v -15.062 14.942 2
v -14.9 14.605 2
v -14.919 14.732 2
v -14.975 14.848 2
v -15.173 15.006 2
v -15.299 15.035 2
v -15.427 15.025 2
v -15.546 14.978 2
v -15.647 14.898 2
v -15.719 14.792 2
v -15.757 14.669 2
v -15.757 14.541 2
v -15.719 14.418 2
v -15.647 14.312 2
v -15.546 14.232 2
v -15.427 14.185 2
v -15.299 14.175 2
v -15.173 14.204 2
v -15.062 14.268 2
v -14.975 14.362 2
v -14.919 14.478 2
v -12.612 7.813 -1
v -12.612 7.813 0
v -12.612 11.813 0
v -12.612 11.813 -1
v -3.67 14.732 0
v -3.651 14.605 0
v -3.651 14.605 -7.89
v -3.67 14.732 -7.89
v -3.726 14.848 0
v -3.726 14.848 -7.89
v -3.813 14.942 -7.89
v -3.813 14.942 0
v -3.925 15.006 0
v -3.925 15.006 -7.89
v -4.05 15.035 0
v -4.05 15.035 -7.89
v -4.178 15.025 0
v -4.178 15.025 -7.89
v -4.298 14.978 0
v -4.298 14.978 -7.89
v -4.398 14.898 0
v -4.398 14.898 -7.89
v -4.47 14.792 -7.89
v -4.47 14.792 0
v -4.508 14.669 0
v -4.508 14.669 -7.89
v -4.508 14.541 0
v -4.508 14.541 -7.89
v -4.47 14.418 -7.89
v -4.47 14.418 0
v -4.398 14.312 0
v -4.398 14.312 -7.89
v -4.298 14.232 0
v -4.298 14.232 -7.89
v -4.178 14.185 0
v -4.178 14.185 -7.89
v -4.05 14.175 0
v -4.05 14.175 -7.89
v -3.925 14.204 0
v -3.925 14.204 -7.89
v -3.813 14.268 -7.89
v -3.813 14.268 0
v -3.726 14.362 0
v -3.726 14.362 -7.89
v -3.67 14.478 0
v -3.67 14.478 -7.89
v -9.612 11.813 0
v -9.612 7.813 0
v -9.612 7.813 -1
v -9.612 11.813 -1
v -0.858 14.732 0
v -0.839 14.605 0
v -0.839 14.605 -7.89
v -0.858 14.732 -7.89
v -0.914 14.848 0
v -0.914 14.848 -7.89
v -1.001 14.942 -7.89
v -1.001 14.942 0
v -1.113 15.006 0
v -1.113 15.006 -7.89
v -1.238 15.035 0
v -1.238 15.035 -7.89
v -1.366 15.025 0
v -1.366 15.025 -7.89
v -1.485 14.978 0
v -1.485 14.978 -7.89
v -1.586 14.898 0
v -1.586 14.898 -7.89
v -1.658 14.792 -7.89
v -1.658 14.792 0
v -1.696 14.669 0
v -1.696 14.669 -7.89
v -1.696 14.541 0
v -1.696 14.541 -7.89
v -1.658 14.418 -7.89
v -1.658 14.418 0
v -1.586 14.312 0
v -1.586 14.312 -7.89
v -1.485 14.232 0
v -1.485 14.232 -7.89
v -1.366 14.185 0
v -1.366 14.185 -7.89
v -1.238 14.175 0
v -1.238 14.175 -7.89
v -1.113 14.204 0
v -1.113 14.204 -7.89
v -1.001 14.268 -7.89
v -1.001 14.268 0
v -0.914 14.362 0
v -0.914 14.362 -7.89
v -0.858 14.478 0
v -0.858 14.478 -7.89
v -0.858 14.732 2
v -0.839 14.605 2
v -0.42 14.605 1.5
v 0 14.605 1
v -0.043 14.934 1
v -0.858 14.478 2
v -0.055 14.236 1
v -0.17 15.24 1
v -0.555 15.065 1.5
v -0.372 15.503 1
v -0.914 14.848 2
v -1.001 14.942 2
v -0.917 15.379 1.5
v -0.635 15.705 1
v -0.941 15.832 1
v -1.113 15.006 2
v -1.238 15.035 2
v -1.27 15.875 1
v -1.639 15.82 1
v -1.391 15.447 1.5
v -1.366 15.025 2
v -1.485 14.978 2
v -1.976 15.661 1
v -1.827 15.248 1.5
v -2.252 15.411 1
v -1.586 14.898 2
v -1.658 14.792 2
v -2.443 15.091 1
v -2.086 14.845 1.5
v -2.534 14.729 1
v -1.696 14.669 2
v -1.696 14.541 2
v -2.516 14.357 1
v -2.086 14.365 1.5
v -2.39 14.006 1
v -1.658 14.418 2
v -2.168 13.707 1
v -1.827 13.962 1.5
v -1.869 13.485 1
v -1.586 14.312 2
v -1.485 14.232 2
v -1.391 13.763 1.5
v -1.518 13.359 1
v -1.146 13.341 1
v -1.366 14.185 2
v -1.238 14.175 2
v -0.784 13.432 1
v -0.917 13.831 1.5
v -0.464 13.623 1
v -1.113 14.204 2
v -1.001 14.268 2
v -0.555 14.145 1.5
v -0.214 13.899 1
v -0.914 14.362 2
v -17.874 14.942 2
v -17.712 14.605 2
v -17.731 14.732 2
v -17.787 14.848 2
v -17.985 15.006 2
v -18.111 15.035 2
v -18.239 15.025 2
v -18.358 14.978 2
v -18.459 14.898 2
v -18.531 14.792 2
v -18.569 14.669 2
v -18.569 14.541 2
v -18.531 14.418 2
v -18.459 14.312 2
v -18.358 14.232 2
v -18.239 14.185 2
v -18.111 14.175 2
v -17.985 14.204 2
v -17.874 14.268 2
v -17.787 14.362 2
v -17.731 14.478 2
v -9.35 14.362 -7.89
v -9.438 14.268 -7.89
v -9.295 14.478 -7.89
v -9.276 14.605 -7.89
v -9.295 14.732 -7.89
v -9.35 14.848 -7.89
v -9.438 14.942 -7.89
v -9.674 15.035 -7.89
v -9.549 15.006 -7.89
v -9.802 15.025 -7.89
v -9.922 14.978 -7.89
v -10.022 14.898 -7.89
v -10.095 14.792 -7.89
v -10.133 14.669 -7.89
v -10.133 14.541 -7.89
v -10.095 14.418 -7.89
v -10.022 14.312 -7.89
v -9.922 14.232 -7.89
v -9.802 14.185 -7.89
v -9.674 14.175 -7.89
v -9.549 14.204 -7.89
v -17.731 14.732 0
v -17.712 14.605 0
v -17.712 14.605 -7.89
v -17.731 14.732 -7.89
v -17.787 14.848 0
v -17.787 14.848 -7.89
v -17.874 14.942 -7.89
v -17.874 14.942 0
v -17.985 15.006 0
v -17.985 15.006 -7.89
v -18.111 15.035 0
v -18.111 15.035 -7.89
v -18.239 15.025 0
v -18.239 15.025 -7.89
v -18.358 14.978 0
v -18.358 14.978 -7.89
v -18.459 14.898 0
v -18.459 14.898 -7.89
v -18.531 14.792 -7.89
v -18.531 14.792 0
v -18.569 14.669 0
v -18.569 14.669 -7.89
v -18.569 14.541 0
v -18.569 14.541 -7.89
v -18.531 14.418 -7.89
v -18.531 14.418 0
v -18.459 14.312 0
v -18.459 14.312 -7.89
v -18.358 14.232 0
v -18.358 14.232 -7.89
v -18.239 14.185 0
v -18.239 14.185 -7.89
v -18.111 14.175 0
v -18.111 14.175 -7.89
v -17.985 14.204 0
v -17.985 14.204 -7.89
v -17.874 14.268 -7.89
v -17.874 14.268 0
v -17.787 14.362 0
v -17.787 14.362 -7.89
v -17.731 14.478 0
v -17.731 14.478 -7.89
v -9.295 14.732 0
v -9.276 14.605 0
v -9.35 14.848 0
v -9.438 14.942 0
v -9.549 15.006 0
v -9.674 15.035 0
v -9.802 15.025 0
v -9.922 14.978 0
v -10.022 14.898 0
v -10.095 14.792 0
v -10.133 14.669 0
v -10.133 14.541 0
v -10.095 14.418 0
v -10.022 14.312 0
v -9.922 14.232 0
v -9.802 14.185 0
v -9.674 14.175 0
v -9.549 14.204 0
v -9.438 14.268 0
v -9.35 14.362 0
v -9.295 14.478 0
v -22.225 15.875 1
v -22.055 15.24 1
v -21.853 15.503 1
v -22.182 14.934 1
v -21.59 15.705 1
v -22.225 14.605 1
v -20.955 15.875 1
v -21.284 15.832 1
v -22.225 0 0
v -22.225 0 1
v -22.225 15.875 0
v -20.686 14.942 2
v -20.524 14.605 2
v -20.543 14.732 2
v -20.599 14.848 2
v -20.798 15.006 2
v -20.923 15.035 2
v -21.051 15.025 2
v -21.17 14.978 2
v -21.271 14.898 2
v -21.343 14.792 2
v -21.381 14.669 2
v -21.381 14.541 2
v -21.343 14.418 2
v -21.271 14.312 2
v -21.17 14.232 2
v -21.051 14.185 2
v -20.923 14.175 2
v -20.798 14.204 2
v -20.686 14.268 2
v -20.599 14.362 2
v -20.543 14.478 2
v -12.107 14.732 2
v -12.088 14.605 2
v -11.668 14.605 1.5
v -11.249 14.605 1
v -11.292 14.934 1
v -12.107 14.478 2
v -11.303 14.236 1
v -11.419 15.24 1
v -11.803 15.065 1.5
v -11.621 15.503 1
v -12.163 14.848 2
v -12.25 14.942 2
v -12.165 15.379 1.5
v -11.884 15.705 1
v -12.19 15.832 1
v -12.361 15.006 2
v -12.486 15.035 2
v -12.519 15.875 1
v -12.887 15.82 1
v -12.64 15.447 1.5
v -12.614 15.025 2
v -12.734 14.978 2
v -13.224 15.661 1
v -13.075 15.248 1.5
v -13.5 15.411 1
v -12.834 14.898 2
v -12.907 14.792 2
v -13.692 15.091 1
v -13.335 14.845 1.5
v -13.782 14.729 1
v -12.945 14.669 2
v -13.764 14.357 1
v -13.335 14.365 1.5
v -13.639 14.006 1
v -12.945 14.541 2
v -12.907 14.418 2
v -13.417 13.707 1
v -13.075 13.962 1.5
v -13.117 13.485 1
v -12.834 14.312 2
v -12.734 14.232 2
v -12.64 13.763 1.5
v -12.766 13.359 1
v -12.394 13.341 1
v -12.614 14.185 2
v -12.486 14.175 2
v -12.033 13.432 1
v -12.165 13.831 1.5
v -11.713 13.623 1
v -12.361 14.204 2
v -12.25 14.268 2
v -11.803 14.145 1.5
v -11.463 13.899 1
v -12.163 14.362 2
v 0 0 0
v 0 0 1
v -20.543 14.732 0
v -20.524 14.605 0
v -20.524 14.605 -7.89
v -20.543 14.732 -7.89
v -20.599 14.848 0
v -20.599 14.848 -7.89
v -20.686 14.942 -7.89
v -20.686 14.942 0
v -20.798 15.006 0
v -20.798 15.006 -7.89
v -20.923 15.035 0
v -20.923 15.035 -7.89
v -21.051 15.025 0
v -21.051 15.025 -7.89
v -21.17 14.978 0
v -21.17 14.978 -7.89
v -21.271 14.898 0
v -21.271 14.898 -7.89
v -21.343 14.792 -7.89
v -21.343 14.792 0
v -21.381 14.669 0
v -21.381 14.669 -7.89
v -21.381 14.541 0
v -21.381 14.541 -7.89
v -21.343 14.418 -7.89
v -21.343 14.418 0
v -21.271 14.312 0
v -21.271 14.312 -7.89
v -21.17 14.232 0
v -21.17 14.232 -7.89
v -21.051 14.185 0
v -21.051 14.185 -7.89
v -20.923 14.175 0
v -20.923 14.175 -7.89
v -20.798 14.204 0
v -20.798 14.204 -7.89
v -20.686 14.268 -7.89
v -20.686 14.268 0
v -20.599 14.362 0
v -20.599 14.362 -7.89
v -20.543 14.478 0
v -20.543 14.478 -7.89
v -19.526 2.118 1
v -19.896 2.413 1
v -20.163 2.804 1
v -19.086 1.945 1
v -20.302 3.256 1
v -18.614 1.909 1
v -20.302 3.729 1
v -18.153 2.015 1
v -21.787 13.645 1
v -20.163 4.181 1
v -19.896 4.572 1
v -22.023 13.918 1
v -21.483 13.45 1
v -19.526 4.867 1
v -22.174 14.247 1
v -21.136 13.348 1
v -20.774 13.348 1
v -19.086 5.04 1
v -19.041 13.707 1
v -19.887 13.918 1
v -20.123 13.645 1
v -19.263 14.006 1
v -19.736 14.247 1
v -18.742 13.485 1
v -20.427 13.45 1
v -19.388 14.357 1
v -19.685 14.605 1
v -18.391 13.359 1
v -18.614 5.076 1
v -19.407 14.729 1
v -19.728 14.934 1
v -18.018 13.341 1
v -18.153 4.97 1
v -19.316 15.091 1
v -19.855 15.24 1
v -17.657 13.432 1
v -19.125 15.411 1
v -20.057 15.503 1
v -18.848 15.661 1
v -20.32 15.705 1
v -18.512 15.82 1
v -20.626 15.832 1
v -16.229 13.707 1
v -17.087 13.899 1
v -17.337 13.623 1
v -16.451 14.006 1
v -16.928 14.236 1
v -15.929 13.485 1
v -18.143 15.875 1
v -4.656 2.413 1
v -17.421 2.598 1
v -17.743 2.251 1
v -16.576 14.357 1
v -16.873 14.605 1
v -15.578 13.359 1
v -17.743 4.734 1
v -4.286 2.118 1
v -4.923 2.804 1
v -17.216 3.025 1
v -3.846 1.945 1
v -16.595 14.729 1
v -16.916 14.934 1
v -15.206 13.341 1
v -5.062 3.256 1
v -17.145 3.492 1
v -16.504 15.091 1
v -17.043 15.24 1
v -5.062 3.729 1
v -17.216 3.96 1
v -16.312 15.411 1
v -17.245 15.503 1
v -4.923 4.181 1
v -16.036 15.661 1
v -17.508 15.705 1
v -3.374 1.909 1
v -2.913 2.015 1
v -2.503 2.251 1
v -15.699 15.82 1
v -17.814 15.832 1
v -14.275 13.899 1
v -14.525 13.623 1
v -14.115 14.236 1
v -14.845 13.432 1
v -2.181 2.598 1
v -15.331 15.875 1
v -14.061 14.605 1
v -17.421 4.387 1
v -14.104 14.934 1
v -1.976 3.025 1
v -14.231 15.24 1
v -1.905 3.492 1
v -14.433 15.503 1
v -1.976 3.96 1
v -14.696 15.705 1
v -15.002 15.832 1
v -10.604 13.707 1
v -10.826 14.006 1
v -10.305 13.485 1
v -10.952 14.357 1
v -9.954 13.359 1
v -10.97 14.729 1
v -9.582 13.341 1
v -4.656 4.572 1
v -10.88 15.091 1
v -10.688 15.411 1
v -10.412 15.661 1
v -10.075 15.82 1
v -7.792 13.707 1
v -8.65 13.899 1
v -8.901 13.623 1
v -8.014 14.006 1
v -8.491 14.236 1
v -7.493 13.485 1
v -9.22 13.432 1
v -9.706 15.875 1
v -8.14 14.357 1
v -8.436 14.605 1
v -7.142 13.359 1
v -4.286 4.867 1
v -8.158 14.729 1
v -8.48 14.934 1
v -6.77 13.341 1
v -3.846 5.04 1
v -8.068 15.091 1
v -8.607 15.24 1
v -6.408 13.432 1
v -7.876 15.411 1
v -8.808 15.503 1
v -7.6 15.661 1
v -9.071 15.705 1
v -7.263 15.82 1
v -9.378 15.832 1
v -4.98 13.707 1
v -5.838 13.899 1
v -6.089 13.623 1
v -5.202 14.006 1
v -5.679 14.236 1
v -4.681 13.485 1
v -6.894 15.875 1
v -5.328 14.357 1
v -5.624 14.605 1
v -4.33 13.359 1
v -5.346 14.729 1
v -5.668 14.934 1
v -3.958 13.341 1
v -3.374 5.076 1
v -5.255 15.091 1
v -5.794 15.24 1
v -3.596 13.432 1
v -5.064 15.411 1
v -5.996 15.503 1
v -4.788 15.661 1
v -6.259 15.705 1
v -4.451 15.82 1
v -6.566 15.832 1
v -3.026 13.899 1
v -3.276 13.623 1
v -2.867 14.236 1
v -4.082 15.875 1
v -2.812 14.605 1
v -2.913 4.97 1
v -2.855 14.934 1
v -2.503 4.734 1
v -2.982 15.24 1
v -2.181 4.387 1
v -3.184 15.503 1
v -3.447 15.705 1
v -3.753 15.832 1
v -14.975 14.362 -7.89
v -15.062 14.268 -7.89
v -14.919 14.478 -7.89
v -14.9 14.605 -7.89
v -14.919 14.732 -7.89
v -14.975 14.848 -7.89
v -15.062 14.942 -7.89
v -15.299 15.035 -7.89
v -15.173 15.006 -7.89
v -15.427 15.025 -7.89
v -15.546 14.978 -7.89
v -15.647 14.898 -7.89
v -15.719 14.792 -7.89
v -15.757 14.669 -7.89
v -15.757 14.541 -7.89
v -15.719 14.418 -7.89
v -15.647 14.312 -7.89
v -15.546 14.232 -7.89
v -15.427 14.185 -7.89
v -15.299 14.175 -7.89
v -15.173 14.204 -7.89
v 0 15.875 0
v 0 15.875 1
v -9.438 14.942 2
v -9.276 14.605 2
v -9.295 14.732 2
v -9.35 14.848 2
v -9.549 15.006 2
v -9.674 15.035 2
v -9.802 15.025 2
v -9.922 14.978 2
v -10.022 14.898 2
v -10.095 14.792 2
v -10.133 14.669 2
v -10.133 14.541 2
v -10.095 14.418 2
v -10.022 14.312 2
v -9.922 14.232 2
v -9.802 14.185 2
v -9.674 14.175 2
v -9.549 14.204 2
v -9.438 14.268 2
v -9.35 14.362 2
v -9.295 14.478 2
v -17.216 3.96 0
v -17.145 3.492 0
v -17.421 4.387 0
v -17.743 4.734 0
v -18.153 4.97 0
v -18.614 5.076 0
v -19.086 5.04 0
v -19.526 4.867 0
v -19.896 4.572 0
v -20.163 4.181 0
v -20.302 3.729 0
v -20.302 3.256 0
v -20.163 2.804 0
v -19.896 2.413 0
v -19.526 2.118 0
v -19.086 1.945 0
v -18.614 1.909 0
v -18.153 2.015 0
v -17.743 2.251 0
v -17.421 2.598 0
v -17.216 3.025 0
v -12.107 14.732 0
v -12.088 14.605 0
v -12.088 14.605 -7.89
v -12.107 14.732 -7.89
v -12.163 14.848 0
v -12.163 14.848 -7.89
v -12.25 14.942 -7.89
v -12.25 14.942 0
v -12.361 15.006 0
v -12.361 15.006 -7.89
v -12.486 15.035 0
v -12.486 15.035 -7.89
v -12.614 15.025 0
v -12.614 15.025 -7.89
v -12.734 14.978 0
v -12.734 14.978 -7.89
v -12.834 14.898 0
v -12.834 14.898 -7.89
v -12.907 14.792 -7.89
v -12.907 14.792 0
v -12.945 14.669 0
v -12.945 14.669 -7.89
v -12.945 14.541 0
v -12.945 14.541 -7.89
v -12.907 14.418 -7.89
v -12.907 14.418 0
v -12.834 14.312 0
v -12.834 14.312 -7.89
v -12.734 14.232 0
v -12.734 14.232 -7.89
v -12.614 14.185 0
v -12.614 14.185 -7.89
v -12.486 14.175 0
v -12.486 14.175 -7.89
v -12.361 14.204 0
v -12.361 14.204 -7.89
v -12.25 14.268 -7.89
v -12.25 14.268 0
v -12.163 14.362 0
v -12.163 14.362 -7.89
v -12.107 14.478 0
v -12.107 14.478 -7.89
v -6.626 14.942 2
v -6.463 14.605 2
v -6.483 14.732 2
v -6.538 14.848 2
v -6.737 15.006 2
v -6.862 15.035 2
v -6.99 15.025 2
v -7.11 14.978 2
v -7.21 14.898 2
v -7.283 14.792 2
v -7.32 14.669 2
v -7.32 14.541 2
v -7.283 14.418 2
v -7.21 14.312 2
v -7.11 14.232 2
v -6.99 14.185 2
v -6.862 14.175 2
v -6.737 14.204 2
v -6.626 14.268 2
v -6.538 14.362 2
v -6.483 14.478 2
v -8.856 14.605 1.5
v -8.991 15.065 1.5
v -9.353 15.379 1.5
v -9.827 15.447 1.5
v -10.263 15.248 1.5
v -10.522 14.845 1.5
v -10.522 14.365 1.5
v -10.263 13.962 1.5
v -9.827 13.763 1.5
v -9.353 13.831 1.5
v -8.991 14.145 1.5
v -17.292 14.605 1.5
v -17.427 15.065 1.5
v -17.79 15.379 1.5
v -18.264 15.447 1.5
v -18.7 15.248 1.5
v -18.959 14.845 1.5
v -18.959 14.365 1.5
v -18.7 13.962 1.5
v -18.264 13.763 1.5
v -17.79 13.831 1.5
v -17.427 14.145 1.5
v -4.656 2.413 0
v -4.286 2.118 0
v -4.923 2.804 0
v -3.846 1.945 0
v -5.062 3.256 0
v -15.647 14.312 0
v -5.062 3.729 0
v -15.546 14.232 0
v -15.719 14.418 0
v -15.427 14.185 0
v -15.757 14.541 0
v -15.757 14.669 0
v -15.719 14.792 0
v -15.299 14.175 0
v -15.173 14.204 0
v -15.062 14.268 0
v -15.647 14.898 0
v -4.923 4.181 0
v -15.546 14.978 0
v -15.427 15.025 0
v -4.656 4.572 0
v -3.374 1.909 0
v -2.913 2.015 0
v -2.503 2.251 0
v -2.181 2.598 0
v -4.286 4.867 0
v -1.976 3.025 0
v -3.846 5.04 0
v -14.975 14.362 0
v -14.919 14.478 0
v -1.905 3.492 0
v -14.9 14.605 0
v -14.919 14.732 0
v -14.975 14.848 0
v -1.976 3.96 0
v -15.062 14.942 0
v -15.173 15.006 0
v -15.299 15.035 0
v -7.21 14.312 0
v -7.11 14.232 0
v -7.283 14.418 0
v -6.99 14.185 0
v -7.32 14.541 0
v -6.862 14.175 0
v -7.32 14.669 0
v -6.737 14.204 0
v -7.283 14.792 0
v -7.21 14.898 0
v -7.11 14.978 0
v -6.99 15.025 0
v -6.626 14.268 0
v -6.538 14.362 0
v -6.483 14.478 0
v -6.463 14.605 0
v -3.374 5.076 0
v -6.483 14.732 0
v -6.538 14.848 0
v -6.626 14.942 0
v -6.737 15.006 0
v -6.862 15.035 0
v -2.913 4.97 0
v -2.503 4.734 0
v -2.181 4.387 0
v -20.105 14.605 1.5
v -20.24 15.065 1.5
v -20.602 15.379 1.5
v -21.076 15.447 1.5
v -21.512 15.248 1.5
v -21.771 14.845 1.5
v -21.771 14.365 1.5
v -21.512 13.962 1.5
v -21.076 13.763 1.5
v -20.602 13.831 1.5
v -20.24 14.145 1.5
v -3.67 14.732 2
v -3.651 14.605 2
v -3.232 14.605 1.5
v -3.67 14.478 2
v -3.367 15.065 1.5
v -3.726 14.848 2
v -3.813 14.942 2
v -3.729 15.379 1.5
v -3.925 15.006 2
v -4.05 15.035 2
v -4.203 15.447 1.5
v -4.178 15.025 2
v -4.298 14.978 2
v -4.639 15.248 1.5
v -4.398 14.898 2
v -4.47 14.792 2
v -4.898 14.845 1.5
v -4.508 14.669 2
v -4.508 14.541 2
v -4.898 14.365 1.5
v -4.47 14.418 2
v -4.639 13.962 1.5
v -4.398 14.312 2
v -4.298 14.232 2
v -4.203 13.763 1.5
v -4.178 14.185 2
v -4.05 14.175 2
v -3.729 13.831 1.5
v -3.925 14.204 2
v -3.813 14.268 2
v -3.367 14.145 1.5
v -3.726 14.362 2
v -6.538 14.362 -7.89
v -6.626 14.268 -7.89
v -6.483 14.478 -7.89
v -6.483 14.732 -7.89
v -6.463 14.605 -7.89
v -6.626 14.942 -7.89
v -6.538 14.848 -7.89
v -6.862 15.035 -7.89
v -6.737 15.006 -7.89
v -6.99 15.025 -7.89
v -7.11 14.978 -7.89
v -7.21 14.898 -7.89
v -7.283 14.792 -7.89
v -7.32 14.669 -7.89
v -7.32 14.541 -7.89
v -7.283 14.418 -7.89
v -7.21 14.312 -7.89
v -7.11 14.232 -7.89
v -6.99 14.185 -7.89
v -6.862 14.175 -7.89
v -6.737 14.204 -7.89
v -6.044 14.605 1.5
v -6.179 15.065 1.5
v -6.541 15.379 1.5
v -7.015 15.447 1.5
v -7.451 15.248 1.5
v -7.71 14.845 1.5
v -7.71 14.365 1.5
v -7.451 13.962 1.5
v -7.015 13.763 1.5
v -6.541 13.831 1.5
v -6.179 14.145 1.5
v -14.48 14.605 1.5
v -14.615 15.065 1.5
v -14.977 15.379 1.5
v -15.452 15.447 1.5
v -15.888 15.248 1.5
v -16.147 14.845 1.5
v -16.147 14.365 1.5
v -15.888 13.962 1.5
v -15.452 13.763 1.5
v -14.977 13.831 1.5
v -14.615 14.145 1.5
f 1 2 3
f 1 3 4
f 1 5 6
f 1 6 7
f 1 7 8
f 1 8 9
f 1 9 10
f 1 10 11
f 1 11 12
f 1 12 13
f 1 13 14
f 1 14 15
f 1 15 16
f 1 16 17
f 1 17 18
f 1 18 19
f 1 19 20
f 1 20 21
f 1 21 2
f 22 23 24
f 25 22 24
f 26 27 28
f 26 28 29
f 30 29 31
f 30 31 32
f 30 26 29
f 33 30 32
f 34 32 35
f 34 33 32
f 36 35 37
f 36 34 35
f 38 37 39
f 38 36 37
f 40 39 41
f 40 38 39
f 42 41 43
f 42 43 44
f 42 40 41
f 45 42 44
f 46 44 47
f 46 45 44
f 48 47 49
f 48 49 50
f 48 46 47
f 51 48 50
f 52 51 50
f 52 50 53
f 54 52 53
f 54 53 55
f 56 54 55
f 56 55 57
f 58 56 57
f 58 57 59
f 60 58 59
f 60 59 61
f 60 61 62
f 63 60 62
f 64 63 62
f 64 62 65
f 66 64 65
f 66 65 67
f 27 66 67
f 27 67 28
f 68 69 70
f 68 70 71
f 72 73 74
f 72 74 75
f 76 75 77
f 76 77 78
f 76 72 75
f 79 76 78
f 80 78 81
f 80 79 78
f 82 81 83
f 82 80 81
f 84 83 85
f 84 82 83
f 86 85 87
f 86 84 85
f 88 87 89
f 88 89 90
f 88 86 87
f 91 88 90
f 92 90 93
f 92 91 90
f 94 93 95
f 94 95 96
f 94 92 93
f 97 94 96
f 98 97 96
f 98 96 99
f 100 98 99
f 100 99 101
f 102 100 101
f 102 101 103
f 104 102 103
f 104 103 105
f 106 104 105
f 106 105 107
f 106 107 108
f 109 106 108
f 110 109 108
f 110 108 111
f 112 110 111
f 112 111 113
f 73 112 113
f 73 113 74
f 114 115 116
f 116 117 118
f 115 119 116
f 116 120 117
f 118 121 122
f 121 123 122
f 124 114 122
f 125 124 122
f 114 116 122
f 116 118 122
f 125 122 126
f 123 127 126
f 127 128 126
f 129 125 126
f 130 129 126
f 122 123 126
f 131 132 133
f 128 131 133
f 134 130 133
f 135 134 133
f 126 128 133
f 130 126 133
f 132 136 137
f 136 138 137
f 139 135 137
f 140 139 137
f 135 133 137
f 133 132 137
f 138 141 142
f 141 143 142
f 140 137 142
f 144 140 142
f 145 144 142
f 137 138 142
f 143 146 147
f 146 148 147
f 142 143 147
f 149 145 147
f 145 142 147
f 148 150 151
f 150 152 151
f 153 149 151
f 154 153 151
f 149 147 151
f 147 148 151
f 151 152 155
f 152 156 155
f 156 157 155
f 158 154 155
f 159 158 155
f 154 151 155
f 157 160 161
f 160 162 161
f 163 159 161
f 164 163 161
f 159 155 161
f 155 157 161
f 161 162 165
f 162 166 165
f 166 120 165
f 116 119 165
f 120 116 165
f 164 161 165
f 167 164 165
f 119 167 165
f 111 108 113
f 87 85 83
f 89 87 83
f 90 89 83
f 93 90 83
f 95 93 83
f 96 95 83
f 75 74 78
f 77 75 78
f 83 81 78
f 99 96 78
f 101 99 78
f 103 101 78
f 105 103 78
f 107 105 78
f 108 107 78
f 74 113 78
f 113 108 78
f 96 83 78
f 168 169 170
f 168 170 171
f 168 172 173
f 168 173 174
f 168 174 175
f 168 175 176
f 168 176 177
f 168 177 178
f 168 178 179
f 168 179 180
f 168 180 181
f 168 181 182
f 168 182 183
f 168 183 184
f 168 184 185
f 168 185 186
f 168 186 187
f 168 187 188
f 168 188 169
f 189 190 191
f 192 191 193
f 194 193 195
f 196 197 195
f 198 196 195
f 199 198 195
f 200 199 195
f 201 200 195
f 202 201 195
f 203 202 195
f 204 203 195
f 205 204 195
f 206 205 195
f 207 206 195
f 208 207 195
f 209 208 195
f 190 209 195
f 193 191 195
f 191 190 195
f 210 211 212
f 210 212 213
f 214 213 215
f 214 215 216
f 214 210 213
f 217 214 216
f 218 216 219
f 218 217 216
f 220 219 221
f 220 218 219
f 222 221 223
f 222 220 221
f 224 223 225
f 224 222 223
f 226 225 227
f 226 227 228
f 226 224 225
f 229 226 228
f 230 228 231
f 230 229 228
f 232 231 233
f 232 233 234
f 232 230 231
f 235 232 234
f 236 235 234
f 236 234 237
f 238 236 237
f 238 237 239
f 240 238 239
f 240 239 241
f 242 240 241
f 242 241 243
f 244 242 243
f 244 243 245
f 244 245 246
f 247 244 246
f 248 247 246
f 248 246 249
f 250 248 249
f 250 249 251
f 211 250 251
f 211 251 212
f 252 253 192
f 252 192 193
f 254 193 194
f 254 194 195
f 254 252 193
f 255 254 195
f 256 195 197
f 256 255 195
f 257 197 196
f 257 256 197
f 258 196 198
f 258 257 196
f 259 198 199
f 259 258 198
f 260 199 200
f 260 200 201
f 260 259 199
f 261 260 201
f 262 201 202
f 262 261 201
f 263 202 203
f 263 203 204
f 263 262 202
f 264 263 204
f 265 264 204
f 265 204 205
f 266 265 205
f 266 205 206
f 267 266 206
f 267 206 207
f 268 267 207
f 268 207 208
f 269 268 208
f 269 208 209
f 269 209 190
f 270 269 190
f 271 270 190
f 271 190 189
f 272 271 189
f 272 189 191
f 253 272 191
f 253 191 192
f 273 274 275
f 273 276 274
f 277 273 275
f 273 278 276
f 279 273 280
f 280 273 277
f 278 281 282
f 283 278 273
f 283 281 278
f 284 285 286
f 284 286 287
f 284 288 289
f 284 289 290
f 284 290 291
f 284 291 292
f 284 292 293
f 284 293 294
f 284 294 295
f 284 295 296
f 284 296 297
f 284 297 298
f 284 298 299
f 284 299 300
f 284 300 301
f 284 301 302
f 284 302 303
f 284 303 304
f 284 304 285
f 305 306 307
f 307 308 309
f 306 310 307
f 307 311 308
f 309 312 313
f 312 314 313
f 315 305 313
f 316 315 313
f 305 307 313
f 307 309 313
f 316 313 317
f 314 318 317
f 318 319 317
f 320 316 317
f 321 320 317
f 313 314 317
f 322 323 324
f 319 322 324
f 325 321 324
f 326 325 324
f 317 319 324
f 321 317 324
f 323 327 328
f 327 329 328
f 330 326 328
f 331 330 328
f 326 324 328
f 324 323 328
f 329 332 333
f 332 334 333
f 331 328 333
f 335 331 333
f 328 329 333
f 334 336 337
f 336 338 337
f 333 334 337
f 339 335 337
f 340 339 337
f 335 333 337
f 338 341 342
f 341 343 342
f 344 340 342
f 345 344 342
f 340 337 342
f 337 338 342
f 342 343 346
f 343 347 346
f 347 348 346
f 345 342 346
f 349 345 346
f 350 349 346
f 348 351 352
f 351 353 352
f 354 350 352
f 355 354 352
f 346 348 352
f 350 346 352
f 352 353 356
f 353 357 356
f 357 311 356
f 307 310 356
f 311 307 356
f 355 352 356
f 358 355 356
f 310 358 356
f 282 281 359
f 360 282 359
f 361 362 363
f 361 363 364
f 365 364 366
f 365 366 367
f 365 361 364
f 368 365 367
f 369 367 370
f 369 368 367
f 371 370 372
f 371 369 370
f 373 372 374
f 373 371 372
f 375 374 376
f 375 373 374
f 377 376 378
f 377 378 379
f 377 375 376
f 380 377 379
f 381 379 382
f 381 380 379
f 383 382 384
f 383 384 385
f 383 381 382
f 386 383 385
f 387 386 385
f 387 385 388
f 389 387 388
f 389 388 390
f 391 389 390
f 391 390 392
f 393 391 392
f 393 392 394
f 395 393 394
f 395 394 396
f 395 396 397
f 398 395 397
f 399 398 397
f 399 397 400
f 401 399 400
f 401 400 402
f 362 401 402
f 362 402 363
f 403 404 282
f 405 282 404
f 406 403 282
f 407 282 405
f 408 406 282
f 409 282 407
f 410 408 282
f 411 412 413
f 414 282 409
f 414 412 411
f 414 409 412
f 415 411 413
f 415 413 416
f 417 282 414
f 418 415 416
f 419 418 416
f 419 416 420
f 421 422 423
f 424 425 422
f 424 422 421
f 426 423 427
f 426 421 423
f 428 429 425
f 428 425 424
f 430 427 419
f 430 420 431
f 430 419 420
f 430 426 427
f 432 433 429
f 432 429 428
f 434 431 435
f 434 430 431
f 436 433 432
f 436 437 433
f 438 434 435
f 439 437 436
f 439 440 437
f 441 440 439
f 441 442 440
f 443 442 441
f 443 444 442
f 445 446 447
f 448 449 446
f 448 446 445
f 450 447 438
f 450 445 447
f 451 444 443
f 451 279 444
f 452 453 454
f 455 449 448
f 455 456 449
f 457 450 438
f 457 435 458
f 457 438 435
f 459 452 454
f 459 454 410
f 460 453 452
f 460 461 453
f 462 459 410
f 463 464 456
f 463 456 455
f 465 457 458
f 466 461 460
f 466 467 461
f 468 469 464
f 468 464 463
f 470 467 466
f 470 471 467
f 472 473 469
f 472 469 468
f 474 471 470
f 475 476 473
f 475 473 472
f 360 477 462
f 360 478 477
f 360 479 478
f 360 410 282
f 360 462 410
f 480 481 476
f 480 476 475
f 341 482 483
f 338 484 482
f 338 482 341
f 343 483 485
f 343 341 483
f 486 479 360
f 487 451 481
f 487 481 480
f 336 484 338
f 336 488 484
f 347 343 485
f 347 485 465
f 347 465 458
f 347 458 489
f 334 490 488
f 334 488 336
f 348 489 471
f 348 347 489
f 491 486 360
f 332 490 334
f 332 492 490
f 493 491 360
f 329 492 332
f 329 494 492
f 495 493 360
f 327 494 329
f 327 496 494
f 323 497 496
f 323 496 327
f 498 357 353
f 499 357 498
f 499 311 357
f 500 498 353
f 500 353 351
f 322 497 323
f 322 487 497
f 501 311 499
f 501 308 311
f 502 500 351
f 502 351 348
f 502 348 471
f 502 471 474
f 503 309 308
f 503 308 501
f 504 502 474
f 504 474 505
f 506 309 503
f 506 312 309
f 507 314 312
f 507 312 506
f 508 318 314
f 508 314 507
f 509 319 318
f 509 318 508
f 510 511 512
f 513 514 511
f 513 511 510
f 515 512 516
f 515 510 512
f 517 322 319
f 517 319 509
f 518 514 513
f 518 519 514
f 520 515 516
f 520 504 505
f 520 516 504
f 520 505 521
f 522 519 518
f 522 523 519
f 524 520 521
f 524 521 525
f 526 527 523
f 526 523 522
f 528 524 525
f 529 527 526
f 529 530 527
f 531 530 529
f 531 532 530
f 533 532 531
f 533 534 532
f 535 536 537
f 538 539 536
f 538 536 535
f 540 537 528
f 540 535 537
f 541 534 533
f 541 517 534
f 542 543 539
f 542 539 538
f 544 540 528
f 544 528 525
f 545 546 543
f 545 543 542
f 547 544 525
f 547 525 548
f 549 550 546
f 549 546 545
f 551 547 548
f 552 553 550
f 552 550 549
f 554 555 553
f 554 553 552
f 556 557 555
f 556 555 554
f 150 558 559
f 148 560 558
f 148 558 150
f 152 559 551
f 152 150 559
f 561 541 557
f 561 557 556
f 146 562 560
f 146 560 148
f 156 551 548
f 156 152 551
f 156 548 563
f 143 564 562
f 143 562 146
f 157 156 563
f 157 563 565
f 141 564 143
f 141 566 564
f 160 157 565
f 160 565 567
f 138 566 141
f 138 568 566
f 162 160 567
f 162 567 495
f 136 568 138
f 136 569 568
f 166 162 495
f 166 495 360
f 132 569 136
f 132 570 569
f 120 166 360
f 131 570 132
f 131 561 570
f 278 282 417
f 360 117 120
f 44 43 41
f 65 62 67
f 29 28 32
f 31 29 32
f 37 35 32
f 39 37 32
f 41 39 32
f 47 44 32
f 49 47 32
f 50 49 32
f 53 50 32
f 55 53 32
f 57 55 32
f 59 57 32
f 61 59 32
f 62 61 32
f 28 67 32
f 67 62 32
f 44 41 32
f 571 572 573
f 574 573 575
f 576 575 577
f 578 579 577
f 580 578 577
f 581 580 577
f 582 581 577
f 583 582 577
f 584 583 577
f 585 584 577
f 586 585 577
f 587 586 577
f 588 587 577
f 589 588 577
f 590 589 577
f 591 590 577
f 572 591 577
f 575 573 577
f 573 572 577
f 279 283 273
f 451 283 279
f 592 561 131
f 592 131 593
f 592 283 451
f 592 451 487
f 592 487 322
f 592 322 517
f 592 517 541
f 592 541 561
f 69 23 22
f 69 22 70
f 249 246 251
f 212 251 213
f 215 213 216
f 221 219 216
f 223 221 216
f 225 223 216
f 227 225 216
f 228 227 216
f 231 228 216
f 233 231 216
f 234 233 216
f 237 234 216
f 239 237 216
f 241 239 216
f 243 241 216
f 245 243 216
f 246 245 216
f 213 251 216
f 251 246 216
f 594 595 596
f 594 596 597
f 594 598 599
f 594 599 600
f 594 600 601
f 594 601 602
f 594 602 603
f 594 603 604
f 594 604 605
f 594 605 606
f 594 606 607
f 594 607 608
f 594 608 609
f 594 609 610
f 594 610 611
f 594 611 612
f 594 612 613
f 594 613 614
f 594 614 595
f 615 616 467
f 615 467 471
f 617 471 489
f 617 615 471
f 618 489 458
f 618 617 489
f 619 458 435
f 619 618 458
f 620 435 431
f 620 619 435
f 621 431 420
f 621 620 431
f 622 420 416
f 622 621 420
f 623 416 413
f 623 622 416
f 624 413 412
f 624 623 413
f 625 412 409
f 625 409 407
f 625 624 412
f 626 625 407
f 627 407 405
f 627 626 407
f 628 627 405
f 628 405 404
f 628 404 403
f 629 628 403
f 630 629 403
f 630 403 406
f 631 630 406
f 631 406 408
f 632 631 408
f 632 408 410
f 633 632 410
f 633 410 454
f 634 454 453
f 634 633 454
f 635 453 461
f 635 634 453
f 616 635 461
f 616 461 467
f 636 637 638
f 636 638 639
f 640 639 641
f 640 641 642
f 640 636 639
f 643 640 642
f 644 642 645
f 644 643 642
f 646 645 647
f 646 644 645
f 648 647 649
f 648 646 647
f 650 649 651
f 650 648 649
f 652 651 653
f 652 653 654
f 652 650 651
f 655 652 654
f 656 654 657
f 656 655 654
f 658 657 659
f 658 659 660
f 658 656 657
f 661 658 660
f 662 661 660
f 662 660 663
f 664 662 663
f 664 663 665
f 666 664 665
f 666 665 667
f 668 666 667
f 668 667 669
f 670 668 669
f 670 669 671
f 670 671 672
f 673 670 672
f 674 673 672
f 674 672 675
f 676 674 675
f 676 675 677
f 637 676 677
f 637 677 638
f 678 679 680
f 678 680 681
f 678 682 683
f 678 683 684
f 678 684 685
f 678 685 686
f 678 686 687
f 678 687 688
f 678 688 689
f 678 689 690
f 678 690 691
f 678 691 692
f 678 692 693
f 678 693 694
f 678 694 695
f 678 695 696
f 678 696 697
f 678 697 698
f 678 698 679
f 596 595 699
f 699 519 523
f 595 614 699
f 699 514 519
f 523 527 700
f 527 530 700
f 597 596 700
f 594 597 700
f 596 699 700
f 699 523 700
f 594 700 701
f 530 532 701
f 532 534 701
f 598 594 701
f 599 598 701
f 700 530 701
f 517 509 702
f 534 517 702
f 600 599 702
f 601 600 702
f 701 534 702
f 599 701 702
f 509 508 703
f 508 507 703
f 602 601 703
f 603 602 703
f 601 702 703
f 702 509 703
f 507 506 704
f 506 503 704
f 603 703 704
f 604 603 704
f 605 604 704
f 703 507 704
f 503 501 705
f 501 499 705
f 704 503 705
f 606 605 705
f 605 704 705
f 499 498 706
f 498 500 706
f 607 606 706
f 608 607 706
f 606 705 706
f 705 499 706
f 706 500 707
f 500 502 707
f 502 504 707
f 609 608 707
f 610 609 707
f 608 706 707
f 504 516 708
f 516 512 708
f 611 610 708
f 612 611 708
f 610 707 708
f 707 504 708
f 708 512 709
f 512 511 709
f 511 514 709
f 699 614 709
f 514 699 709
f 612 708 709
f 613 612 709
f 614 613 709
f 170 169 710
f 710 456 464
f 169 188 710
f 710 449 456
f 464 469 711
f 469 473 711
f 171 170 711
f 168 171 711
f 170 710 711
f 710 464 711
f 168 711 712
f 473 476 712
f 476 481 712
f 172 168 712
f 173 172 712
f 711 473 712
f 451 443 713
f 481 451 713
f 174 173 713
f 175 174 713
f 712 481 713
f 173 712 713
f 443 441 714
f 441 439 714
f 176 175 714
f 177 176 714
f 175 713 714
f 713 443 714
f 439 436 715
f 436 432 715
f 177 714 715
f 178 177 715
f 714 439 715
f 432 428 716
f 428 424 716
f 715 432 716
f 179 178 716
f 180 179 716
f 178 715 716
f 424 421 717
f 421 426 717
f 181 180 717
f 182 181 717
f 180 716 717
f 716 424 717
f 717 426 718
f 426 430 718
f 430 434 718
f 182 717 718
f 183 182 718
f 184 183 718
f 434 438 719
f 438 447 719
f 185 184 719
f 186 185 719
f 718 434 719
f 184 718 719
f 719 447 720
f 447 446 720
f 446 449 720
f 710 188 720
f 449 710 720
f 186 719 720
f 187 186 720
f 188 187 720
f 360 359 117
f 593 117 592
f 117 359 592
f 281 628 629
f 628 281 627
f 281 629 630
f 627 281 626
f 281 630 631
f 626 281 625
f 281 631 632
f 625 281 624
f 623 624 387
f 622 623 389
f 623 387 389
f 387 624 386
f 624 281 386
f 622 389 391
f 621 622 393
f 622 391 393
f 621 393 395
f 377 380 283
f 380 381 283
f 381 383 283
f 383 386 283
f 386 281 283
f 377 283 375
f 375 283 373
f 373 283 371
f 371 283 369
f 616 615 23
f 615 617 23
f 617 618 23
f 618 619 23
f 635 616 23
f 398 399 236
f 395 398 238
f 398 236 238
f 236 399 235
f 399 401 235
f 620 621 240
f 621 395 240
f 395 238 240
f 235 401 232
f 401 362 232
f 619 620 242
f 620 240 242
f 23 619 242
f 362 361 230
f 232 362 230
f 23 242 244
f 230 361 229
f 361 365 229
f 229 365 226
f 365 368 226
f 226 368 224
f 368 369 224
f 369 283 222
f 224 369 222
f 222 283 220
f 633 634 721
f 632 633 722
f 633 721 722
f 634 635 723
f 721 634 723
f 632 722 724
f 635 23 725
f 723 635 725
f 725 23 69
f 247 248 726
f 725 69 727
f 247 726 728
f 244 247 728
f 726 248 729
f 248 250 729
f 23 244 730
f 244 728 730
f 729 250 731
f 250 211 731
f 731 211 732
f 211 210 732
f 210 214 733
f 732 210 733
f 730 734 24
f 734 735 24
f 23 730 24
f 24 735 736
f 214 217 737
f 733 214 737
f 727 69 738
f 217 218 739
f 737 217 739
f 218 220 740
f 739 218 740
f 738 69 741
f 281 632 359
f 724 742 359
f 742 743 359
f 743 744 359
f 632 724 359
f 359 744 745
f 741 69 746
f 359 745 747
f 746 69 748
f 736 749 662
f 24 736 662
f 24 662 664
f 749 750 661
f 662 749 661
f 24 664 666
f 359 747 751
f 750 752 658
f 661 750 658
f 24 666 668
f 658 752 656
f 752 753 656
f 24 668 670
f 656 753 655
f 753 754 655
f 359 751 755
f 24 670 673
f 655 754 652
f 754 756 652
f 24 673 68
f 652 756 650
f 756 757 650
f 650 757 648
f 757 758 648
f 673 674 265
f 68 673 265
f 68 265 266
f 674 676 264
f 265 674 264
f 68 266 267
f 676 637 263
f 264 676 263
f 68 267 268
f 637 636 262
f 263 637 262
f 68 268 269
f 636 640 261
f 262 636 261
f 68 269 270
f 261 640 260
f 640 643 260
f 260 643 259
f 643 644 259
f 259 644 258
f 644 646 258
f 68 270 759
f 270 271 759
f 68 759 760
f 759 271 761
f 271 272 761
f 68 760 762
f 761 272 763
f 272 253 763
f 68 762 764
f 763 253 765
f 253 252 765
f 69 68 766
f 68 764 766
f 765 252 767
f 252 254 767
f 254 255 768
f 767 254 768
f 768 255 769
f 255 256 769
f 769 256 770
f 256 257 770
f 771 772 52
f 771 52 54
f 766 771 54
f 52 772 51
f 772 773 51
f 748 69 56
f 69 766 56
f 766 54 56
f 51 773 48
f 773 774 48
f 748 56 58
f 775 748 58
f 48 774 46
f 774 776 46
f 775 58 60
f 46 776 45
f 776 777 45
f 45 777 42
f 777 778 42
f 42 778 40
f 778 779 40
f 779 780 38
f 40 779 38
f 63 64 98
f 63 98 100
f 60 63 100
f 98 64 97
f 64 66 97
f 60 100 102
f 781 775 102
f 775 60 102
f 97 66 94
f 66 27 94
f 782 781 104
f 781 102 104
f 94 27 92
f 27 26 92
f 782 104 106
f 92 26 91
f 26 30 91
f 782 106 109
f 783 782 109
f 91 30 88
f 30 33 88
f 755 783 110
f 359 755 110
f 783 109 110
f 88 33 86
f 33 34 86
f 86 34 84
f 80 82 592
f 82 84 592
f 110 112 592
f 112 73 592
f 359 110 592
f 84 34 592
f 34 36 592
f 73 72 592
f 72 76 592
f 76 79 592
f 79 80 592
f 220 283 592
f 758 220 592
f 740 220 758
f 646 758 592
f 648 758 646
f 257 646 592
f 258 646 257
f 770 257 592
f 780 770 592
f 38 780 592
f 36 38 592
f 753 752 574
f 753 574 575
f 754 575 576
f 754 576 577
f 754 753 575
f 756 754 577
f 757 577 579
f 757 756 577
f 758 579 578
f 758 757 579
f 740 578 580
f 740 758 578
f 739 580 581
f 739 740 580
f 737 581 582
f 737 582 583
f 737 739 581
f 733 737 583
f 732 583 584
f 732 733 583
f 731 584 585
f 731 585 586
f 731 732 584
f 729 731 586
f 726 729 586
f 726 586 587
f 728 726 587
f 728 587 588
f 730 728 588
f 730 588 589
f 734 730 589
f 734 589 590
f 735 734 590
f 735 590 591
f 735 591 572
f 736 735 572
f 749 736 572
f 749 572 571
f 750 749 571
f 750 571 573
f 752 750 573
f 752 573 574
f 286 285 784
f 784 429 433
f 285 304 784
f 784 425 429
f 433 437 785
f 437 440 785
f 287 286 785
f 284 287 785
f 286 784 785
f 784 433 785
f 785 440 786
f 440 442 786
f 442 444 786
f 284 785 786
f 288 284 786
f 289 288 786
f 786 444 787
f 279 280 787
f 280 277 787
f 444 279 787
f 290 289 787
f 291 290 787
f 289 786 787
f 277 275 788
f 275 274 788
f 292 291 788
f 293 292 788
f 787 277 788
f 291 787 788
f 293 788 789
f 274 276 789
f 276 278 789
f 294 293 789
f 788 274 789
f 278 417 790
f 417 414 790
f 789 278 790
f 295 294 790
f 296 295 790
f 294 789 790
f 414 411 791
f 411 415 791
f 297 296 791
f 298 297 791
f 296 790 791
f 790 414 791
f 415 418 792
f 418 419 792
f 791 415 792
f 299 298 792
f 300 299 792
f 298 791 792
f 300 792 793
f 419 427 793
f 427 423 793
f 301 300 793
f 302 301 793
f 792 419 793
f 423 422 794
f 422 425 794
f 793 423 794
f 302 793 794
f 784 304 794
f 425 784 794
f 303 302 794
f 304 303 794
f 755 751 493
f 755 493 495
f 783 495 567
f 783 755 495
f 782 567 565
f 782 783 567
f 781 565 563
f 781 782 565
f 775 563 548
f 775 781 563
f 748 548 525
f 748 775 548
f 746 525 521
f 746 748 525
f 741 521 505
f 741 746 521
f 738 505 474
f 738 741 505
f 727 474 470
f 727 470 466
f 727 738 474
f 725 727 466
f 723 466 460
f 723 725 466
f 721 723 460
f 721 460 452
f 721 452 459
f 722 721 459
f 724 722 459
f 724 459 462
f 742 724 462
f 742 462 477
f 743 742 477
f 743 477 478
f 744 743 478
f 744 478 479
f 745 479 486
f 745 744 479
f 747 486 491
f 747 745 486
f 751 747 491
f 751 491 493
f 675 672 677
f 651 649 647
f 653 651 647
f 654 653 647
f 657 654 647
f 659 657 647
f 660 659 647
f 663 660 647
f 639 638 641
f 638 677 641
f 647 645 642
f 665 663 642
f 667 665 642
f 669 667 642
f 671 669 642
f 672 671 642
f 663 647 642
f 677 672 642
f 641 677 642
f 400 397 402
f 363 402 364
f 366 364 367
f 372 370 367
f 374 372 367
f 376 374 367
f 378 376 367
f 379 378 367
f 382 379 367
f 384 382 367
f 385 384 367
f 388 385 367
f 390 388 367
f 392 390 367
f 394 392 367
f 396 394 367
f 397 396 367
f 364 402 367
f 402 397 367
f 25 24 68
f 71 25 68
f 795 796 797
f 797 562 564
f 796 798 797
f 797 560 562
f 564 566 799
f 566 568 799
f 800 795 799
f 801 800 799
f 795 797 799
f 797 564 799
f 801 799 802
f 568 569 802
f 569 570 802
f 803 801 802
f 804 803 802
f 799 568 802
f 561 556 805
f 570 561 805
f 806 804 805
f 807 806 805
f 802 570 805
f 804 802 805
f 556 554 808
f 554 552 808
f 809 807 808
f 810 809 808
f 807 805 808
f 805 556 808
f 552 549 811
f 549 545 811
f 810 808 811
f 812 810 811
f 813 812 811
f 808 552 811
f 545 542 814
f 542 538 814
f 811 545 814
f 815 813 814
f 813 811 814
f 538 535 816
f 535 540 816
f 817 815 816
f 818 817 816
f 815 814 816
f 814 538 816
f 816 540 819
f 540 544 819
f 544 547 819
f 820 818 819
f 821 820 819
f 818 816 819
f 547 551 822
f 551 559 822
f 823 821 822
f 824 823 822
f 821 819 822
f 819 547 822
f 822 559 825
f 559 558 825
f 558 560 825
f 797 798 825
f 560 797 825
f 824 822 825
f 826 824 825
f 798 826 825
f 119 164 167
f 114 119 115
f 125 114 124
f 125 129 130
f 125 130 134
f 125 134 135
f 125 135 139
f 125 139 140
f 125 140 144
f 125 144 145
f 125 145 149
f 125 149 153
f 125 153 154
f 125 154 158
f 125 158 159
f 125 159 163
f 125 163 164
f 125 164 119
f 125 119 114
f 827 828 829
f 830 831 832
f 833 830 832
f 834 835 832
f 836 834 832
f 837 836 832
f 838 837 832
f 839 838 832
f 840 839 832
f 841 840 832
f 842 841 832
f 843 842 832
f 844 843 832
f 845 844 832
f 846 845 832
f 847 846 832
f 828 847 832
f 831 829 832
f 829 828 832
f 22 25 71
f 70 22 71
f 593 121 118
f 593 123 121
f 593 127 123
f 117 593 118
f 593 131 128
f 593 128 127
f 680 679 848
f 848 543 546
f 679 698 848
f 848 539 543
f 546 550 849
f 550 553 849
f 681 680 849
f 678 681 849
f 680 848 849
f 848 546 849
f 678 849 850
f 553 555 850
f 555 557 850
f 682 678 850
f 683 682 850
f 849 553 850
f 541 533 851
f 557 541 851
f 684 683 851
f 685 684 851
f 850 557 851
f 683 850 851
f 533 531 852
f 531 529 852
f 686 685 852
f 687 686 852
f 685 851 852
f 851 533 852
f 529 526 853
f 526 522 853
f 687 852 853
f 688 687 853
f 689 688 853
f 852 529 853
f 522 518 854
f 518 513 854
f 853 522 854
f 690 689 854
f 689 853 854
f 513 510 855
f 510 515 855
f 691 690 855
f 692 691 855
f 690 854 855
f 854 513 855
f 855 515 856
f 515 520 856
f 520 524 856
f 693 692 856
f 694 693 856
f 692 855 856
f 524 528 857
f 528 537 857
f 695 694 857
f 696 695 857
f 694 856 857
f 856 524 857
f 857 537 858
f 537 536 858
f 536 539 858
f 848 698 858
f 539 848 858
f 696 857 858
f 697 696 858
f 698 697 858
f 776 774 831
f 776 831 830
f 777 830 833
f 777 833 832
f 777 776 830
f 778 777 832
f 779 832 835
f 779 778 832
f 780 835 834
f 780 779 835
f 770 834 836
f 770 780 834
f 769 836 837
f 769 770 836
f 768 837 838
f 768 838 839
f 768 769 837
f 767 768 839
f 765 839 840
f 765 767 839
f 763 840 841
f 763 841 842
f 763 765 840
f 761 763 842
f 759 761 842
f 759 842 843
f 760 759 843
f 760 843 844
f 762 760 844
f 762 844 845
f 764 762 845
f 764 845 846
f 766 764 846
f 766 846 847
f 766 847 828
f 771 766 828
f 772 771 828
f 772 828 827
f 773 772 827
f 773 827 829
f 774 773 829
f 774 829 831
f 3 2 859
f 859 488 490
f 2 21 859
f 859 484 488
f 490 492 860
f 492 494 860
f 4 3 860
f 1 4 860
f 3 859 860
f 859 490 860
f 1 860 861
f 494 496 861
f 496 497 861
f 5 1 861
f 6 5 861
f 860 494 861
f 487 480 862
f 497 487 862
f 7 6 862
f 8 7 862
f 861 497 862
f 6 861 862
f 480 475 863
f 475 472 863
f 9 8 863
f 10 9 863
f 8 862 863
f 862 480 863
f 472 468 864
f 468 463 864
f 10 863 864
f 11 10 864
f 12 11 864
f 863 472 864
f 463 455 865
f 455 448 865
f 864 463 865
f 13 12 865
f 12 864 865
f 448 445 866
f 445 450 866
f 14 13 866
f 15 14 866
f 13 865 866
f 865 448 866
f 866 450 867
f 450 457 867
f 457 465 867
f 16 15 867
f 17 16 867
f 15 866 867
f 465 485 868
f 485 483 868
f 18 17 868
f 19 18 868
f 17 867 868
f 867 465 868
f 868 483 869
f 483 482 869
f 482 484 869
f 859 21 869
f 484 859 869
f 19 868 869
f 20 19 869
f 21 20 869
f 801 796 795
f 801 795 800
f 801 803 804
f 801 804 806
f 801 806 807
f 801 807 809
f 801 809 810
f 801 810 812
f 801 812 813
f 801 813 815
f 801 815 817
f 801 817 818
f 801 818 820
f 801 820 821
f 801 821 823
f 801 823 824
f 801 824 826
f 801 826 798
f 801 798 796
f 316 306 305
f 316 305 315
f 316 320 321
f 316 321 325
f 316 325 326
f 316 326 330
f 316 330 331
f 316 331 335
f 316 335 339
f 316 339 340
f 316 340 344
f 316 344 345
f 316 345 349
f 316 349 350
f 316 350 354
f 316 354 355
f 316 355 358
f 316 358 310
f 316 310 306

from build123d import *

# Parameters (mm, degrees)
SKETCH1_W                     = 22.225
SKETCH1_H                     = 15.875
SKETCH1_R                     = 1.5875
BOSS_EXTRUDE1_DEPTH           = 1
SKETCH2_W                     = 3
SKETCH2_H                     = 4
BOSS_EXTRUDE2_DEPTH           = 1
SKETCH3_R                     = 1.27
BOSS_EXTRUDE3_DEPTH           = 1
BOSS_EXTRUDE3_DRAFT           = 40
BOSS_EXTRUDE3_PROFILE_2_DEPTH = 1
BOSS_EXTRUDE3_PROFILE_2_DRAFT = 40
BOSS_EXTRUDE3_PROFILE_3_DEPTH = 1
BOSS_EXTRUDE3_PROFILE_3_DRAFT = 40
BOSS_EXTRUDE3_PROFILE_4_DEPTH = 1
BOSS_EXTRUDE3_PROFILE_4_DRAFT = 40
BOSS_EXTRUDE3_PROFILE_5_DEPTH = 1
BOSS_EXTRUDE3_PROFILE_5_DRAFT = 40
BOSS_EXTRUDE3_PROFILE_6_DEPTH = 1
BOSS_EXTRUDE3_PROFILE_6_DRAFT = 40
BOSS_EXTRUDE3_PROFILE_7_DEPTH = 1
BOSS_EXTRUDE3_PROFILE_7_DRAFT = 40
BOSS_EXTRUDE3_PROFILE_8_DEPTH = 1
BOSS_EXTRUDE3_PROFILE_8_DRAFT = 40
SKETCH4_R                     = 0.430900369
BOSS_EXTRUDE4_DEPTH           = 9.89


with BuildPart() as part:
    # Sketch1 → Boss-Extrude1 (new body)
    with BuildSketch(Plane.XY):
        with Locations((-11.1125, 7.9375)):
            Rectangle(SKETCH1_W, SKETCH1_H)
        with Locations((-18.7325, 3.4925)):
            Circle(SKETCH1_R, mode=Mode.SUBTRACT)
        with Locations((-3.4925, 3.4925)):
            Circle(SKETCH1_R, mode=Mode.SUBTRACT)
    extrude(amount=BOSS_EXTRUDE1_DEPTH)

    # Sketch2 → Boss-Extrude2 (add)
    with BuildSketch(Plane.XY):
        with Locations((-11.1125, 9.812715541)):
            Rectangle(SKETCH2_W, SKETCH2_H)
    extrude(amount=-BOSS_EXTRUDE2_DEPTH)


with BuildPart() as boss_extrude3_tool:
    # Sketch3 → Boss-Extrude3 (with draft: the straight prism first)
    with BuildSketch(Plane.XY.offset(1)):
        with Locations((-20.955, 14.605)):
            Circle(SKETCH3_R)
    extrude(amount=BOSS_EXTRUDE3_DEPTH)
    # Boss-Extrude3: the draft: its side faces are tilted about the plane it starts from
    boss_extrude3_sides = [boss_extrude3_tool.faces().sort_by_distance(p)[0] for p in [
        (-22.225, 14.605, 1.5),
    ]]
    draft(boss_extrude3_sides, Plane.XY.offset(1), BOSS_EXTRUDE3_DRAFT)


with BuildPart() as part_1:
    add(part.part)

    # Boss-Extrude3: add boss_extrude3_tool
    add(boss_extrude3_tool.part)


with BuildPart() as boss_extrude3_profile_2_tool:
    # Sketch3 → Boss-Extrude3 profile 2 (with draft: the straight prism first)
    with BuildSketch(Plane.XY.offset(1)):
        with Locations((-18.142857143, 14.605)):
            Circle(SKETCH3_R)
    extrude(amount=BOSS_EXTRUDE3_PROFILE_2_DEPTH)
    # Boss-Extrude3 profile 2: the draft: its side faces are tilted about the plane it starts from
    boss_extrude3_profile_2_sides = [boss_extrude3_profile_2_tool.faces().sort_by_distance(p)[0] for p in [
        (-19.412857143, 14.605, 1.5),
    ]]
    draft(boss_extrude3_profile_2_sides, Plane.XY.offset(1), BOSS_EXTRUDE3_PROFILE_2_DRAFT)


with BuildPart() as part_2:
    add(part_1.part)

    # Boss-Extrude3 profile 2: add boss_extrude3_profile_2_tool
    add(boss_extrude3_profile_2_tool.part)


with BuildPart() as boss_extrude3_profile_3_tool:
    # Sketch3 → Boss-Extrude3 profile 3 (with draft: the straight prism first)
    with BuildSketch(Plane.XY.offset(1)):
        with Locations((-15.330714286, 14.605)):
            Circle(SKETCH3_R)
    extrude(amount=BOSS_EXTRUDE3_PROFILE_3_DEPTH)
    # Boss-Extrude3 profile 3: the draft: its side faces are tilted about the plane it starts from
    boss_extrude3_profile_3_sides = [boss_extrude3_profile_3_tool.faces().sort_by_distance(p)[0] for p in [
        (-16.600714286, 14.605, 1.5),
    ]]
    draft(boss_extrude3_profile_3_sides, Plane.XY.offset(1), BOSS_EXTRUDE3_PROFILE_3_DRAFT)


with BuildPart() as part_3:
    add(part_2.part)

    # Boss-Extrude3 profile 3: add boss_extrude3_profile_3_tool
    add(boss_extrude3_profile_3_tool.part)


with BuildPart() as boss_extrude3_profile_4_tool:
    # Sketch3 → Boss-Extrude3 profile 4 (with draft: the straight prism first)
    with BuildSketch(Plane.XY.offset(1)):
        with Locations((-12.518571429, 14.605)):
            Circle(SKETCH3_R)
    extrude(amount=BOSS_EXTRUDE3_PROFILE_4_DEPTH)
    # Boss-Extrude3 profile 4: the draft: its side faces are tilted about the plane it starts from
    boss_extrude3_profile_4_sides = [boss_extrude3_profile_4_tool.faces().sort_by_distance(p)[0] for p in [
        (-13.788571429, 14.605, 1.5),
    ]]
    draft(boss_extrude3_profile_4_sides, Plane.XY.offset(1), BOSS_EXTRUDE3_PROFILE_4_DRAFT)


with BuildPart() as part_4:
    add(part_3.part)

    # Boss-Extrude3 profile 4: add boss_extrude3_profile_4_tool
    add(boss_extrude3_profile_4_tool.part)


with BuildPart() as boss_extrude3_profile_5_tool:
    # Sketch3 → Boss-Extrude3 profile 5 (with draft: the straight prism first)
    with BuildSketch(Plane.XY.offset(1)):
        with Locations((-9.706428571, 14.605)):
            Circle(SKETCH3_R)
    extrude(amount=BOSS_EXTRUDE3_PROFILE_5_DEPTH)
    # Boss-Extrude3 profile 5: the draft: its side faces are tilted about the plane it starts from
    boss_extrude3_profile_5_sides = [boss_extrude3_profile_5_tool.faces().sort_by_distance(p)[0] for p in [
        (-10.976428571, 14.605, 1.5),
    ]]
    draft(boss_extrude3_profile_5_sides, Plane.XY.offset(1), BOSS_EXTRUDE3_PROFILE_5_DRAFT)


with BuildPart() as part_5:
    add(part_4.part)

    # Boss-Extrude3 profile 5: add boss_extrude3_profile_5_tool
    add(boss_extrude3_profile_5_tool.part)


with BuildPart() as boss_extrude3_profile_6_tool:
    # Sketch3 → Boss-Extrude3 profile 6 (with draft: the straight prism first)
    with BuildSketch(Plane.XY.offset(1)):
        with Locations((-6.894285714, 14.605)):
            Circle(SKETCH3_R)
    extrude(amount=BOSS_EXTRUDE3_PROFILE_6_DEPTH)
    # Boss-Extrude3 profile 6: the draft: its side faces are tilted about the plane it starts from
    boss_extrude3_profile_6_sides = [boss_extrude3_profile_6_tool.faces().sort_by_distance(p)[0] for p in [
        (-8.164285714, 14.605, 1.5),
    ]]
    draft(boss_extrude3_profile_6_sides, Plane.XY.offset(1), BOSS_EXTRUDE3_PROFILE_6_DRAFT)


with BuildPart() as part_6:
    add(part_5.part)

    # Boss-Extrude3 profile 6: add boss_extrude3_profile_6_tool
    add(boss_extrude3_profile_6_tool.part)


with BuildPart() as boss_extrude3_profile_7_tool:
    # Sketch3 → Boss-Extrude3 profile 7 (with draft: the straight prism first)
    with BuildSketch(Plane.XY.offset(1)):
        with Locations((-4.082142857, 14.605)):
            Circle(SKETCH3_R)
    extrude(amount=BOSS_EXTRUDE3_PROFILE_7_DEPTH)
    # Boss-Extrude3 profile 7: the draft: its side faces are tilted about the plane it starts from
    boss_extrude3_profile_7_sides = [boss_extrude3_profile_7_tool.faces().sort_by_distance(p)[0] for p in [
        (-5.352142857, 14.605, 1.5),
    ]]
    draft(boss_extrude3_profile_7_sides, Plane.XY.offset(1), BOSS_EXTRUDE3_PROFILE_7_DRAFT)


with BuildPart() as part_7:
    add(part_6.part)

    # Boss-Extrude3 profile 7: add boss_extrude3_profile_7_tool
    add(boss_extrude3_profile_7_tool.part)


with BuildPart() as boss_extrude3_profile_8_tool:
    # Sketch3 → Boss-Extrude3 profile 8 (with draft: the straight prism first)
    with BuildSketch(Plane.XY.offset(1)):
        with Locations((-1.27, 14.605)):
            Circle(SKETCH3_R)
    extrude(amount=BOSS_EXTRUDE3_PROFILE_8_DEPTH)
    # Boss-Extrude3 profile 8: the draft: its side faces are tilted about the plane it starts from
    boss_extrude3_profile_8_sides = [boss_extrude3_profile_8_tool.faces().sort_by_distance(p)[0] for p in [
        (-2.54, 14.605, 1.5),
    ]]
    draft(boss_extrude3_profile_8_sides, Plane.XY.offset(1), BOSS_EXTRUDE3_PROFILE_8_DRAFT)


with BuildPart() as part_8:
    add(part_7.part)

    # Boss-Extrude3 profile 8: add boss_extrude3_profile_8_tool
    add(boss_extrude3_profile_8_tool.part)

    # Sketch4 → Boss-Extrude4 (add)
    with BuildSketch(Plane.XY.offset(2)):
        with Locations((-20.955, 14.605)):
            Circle(SKETCH4_R)
        with Locations((-18.142857143, 14.605)):
            Circle(SKETCH4_R)
        with Locations((-15.330714286, 14.605)):
            Circle(SKETCH4_R)
        with Locations((-12.518571429, 14.605)):
            Circle(SKETCH4_R)
        with Locations((-9.706428571, 14.605)):
            Circle(SKETCH4_R)
        with Locations((-6.894285714, 14.605)):
            Circle(SKETCH4_R)
        with Locations((-4.082142857, 14.605)):
            Circle(SKETCH4_R)
        with Locations((-1.27, 14.605)):
            Circle(SKETCH4_R)
    extrude(amount=-BOSS_EXTRUDE4_DEPTH)


solid = part_8.part
